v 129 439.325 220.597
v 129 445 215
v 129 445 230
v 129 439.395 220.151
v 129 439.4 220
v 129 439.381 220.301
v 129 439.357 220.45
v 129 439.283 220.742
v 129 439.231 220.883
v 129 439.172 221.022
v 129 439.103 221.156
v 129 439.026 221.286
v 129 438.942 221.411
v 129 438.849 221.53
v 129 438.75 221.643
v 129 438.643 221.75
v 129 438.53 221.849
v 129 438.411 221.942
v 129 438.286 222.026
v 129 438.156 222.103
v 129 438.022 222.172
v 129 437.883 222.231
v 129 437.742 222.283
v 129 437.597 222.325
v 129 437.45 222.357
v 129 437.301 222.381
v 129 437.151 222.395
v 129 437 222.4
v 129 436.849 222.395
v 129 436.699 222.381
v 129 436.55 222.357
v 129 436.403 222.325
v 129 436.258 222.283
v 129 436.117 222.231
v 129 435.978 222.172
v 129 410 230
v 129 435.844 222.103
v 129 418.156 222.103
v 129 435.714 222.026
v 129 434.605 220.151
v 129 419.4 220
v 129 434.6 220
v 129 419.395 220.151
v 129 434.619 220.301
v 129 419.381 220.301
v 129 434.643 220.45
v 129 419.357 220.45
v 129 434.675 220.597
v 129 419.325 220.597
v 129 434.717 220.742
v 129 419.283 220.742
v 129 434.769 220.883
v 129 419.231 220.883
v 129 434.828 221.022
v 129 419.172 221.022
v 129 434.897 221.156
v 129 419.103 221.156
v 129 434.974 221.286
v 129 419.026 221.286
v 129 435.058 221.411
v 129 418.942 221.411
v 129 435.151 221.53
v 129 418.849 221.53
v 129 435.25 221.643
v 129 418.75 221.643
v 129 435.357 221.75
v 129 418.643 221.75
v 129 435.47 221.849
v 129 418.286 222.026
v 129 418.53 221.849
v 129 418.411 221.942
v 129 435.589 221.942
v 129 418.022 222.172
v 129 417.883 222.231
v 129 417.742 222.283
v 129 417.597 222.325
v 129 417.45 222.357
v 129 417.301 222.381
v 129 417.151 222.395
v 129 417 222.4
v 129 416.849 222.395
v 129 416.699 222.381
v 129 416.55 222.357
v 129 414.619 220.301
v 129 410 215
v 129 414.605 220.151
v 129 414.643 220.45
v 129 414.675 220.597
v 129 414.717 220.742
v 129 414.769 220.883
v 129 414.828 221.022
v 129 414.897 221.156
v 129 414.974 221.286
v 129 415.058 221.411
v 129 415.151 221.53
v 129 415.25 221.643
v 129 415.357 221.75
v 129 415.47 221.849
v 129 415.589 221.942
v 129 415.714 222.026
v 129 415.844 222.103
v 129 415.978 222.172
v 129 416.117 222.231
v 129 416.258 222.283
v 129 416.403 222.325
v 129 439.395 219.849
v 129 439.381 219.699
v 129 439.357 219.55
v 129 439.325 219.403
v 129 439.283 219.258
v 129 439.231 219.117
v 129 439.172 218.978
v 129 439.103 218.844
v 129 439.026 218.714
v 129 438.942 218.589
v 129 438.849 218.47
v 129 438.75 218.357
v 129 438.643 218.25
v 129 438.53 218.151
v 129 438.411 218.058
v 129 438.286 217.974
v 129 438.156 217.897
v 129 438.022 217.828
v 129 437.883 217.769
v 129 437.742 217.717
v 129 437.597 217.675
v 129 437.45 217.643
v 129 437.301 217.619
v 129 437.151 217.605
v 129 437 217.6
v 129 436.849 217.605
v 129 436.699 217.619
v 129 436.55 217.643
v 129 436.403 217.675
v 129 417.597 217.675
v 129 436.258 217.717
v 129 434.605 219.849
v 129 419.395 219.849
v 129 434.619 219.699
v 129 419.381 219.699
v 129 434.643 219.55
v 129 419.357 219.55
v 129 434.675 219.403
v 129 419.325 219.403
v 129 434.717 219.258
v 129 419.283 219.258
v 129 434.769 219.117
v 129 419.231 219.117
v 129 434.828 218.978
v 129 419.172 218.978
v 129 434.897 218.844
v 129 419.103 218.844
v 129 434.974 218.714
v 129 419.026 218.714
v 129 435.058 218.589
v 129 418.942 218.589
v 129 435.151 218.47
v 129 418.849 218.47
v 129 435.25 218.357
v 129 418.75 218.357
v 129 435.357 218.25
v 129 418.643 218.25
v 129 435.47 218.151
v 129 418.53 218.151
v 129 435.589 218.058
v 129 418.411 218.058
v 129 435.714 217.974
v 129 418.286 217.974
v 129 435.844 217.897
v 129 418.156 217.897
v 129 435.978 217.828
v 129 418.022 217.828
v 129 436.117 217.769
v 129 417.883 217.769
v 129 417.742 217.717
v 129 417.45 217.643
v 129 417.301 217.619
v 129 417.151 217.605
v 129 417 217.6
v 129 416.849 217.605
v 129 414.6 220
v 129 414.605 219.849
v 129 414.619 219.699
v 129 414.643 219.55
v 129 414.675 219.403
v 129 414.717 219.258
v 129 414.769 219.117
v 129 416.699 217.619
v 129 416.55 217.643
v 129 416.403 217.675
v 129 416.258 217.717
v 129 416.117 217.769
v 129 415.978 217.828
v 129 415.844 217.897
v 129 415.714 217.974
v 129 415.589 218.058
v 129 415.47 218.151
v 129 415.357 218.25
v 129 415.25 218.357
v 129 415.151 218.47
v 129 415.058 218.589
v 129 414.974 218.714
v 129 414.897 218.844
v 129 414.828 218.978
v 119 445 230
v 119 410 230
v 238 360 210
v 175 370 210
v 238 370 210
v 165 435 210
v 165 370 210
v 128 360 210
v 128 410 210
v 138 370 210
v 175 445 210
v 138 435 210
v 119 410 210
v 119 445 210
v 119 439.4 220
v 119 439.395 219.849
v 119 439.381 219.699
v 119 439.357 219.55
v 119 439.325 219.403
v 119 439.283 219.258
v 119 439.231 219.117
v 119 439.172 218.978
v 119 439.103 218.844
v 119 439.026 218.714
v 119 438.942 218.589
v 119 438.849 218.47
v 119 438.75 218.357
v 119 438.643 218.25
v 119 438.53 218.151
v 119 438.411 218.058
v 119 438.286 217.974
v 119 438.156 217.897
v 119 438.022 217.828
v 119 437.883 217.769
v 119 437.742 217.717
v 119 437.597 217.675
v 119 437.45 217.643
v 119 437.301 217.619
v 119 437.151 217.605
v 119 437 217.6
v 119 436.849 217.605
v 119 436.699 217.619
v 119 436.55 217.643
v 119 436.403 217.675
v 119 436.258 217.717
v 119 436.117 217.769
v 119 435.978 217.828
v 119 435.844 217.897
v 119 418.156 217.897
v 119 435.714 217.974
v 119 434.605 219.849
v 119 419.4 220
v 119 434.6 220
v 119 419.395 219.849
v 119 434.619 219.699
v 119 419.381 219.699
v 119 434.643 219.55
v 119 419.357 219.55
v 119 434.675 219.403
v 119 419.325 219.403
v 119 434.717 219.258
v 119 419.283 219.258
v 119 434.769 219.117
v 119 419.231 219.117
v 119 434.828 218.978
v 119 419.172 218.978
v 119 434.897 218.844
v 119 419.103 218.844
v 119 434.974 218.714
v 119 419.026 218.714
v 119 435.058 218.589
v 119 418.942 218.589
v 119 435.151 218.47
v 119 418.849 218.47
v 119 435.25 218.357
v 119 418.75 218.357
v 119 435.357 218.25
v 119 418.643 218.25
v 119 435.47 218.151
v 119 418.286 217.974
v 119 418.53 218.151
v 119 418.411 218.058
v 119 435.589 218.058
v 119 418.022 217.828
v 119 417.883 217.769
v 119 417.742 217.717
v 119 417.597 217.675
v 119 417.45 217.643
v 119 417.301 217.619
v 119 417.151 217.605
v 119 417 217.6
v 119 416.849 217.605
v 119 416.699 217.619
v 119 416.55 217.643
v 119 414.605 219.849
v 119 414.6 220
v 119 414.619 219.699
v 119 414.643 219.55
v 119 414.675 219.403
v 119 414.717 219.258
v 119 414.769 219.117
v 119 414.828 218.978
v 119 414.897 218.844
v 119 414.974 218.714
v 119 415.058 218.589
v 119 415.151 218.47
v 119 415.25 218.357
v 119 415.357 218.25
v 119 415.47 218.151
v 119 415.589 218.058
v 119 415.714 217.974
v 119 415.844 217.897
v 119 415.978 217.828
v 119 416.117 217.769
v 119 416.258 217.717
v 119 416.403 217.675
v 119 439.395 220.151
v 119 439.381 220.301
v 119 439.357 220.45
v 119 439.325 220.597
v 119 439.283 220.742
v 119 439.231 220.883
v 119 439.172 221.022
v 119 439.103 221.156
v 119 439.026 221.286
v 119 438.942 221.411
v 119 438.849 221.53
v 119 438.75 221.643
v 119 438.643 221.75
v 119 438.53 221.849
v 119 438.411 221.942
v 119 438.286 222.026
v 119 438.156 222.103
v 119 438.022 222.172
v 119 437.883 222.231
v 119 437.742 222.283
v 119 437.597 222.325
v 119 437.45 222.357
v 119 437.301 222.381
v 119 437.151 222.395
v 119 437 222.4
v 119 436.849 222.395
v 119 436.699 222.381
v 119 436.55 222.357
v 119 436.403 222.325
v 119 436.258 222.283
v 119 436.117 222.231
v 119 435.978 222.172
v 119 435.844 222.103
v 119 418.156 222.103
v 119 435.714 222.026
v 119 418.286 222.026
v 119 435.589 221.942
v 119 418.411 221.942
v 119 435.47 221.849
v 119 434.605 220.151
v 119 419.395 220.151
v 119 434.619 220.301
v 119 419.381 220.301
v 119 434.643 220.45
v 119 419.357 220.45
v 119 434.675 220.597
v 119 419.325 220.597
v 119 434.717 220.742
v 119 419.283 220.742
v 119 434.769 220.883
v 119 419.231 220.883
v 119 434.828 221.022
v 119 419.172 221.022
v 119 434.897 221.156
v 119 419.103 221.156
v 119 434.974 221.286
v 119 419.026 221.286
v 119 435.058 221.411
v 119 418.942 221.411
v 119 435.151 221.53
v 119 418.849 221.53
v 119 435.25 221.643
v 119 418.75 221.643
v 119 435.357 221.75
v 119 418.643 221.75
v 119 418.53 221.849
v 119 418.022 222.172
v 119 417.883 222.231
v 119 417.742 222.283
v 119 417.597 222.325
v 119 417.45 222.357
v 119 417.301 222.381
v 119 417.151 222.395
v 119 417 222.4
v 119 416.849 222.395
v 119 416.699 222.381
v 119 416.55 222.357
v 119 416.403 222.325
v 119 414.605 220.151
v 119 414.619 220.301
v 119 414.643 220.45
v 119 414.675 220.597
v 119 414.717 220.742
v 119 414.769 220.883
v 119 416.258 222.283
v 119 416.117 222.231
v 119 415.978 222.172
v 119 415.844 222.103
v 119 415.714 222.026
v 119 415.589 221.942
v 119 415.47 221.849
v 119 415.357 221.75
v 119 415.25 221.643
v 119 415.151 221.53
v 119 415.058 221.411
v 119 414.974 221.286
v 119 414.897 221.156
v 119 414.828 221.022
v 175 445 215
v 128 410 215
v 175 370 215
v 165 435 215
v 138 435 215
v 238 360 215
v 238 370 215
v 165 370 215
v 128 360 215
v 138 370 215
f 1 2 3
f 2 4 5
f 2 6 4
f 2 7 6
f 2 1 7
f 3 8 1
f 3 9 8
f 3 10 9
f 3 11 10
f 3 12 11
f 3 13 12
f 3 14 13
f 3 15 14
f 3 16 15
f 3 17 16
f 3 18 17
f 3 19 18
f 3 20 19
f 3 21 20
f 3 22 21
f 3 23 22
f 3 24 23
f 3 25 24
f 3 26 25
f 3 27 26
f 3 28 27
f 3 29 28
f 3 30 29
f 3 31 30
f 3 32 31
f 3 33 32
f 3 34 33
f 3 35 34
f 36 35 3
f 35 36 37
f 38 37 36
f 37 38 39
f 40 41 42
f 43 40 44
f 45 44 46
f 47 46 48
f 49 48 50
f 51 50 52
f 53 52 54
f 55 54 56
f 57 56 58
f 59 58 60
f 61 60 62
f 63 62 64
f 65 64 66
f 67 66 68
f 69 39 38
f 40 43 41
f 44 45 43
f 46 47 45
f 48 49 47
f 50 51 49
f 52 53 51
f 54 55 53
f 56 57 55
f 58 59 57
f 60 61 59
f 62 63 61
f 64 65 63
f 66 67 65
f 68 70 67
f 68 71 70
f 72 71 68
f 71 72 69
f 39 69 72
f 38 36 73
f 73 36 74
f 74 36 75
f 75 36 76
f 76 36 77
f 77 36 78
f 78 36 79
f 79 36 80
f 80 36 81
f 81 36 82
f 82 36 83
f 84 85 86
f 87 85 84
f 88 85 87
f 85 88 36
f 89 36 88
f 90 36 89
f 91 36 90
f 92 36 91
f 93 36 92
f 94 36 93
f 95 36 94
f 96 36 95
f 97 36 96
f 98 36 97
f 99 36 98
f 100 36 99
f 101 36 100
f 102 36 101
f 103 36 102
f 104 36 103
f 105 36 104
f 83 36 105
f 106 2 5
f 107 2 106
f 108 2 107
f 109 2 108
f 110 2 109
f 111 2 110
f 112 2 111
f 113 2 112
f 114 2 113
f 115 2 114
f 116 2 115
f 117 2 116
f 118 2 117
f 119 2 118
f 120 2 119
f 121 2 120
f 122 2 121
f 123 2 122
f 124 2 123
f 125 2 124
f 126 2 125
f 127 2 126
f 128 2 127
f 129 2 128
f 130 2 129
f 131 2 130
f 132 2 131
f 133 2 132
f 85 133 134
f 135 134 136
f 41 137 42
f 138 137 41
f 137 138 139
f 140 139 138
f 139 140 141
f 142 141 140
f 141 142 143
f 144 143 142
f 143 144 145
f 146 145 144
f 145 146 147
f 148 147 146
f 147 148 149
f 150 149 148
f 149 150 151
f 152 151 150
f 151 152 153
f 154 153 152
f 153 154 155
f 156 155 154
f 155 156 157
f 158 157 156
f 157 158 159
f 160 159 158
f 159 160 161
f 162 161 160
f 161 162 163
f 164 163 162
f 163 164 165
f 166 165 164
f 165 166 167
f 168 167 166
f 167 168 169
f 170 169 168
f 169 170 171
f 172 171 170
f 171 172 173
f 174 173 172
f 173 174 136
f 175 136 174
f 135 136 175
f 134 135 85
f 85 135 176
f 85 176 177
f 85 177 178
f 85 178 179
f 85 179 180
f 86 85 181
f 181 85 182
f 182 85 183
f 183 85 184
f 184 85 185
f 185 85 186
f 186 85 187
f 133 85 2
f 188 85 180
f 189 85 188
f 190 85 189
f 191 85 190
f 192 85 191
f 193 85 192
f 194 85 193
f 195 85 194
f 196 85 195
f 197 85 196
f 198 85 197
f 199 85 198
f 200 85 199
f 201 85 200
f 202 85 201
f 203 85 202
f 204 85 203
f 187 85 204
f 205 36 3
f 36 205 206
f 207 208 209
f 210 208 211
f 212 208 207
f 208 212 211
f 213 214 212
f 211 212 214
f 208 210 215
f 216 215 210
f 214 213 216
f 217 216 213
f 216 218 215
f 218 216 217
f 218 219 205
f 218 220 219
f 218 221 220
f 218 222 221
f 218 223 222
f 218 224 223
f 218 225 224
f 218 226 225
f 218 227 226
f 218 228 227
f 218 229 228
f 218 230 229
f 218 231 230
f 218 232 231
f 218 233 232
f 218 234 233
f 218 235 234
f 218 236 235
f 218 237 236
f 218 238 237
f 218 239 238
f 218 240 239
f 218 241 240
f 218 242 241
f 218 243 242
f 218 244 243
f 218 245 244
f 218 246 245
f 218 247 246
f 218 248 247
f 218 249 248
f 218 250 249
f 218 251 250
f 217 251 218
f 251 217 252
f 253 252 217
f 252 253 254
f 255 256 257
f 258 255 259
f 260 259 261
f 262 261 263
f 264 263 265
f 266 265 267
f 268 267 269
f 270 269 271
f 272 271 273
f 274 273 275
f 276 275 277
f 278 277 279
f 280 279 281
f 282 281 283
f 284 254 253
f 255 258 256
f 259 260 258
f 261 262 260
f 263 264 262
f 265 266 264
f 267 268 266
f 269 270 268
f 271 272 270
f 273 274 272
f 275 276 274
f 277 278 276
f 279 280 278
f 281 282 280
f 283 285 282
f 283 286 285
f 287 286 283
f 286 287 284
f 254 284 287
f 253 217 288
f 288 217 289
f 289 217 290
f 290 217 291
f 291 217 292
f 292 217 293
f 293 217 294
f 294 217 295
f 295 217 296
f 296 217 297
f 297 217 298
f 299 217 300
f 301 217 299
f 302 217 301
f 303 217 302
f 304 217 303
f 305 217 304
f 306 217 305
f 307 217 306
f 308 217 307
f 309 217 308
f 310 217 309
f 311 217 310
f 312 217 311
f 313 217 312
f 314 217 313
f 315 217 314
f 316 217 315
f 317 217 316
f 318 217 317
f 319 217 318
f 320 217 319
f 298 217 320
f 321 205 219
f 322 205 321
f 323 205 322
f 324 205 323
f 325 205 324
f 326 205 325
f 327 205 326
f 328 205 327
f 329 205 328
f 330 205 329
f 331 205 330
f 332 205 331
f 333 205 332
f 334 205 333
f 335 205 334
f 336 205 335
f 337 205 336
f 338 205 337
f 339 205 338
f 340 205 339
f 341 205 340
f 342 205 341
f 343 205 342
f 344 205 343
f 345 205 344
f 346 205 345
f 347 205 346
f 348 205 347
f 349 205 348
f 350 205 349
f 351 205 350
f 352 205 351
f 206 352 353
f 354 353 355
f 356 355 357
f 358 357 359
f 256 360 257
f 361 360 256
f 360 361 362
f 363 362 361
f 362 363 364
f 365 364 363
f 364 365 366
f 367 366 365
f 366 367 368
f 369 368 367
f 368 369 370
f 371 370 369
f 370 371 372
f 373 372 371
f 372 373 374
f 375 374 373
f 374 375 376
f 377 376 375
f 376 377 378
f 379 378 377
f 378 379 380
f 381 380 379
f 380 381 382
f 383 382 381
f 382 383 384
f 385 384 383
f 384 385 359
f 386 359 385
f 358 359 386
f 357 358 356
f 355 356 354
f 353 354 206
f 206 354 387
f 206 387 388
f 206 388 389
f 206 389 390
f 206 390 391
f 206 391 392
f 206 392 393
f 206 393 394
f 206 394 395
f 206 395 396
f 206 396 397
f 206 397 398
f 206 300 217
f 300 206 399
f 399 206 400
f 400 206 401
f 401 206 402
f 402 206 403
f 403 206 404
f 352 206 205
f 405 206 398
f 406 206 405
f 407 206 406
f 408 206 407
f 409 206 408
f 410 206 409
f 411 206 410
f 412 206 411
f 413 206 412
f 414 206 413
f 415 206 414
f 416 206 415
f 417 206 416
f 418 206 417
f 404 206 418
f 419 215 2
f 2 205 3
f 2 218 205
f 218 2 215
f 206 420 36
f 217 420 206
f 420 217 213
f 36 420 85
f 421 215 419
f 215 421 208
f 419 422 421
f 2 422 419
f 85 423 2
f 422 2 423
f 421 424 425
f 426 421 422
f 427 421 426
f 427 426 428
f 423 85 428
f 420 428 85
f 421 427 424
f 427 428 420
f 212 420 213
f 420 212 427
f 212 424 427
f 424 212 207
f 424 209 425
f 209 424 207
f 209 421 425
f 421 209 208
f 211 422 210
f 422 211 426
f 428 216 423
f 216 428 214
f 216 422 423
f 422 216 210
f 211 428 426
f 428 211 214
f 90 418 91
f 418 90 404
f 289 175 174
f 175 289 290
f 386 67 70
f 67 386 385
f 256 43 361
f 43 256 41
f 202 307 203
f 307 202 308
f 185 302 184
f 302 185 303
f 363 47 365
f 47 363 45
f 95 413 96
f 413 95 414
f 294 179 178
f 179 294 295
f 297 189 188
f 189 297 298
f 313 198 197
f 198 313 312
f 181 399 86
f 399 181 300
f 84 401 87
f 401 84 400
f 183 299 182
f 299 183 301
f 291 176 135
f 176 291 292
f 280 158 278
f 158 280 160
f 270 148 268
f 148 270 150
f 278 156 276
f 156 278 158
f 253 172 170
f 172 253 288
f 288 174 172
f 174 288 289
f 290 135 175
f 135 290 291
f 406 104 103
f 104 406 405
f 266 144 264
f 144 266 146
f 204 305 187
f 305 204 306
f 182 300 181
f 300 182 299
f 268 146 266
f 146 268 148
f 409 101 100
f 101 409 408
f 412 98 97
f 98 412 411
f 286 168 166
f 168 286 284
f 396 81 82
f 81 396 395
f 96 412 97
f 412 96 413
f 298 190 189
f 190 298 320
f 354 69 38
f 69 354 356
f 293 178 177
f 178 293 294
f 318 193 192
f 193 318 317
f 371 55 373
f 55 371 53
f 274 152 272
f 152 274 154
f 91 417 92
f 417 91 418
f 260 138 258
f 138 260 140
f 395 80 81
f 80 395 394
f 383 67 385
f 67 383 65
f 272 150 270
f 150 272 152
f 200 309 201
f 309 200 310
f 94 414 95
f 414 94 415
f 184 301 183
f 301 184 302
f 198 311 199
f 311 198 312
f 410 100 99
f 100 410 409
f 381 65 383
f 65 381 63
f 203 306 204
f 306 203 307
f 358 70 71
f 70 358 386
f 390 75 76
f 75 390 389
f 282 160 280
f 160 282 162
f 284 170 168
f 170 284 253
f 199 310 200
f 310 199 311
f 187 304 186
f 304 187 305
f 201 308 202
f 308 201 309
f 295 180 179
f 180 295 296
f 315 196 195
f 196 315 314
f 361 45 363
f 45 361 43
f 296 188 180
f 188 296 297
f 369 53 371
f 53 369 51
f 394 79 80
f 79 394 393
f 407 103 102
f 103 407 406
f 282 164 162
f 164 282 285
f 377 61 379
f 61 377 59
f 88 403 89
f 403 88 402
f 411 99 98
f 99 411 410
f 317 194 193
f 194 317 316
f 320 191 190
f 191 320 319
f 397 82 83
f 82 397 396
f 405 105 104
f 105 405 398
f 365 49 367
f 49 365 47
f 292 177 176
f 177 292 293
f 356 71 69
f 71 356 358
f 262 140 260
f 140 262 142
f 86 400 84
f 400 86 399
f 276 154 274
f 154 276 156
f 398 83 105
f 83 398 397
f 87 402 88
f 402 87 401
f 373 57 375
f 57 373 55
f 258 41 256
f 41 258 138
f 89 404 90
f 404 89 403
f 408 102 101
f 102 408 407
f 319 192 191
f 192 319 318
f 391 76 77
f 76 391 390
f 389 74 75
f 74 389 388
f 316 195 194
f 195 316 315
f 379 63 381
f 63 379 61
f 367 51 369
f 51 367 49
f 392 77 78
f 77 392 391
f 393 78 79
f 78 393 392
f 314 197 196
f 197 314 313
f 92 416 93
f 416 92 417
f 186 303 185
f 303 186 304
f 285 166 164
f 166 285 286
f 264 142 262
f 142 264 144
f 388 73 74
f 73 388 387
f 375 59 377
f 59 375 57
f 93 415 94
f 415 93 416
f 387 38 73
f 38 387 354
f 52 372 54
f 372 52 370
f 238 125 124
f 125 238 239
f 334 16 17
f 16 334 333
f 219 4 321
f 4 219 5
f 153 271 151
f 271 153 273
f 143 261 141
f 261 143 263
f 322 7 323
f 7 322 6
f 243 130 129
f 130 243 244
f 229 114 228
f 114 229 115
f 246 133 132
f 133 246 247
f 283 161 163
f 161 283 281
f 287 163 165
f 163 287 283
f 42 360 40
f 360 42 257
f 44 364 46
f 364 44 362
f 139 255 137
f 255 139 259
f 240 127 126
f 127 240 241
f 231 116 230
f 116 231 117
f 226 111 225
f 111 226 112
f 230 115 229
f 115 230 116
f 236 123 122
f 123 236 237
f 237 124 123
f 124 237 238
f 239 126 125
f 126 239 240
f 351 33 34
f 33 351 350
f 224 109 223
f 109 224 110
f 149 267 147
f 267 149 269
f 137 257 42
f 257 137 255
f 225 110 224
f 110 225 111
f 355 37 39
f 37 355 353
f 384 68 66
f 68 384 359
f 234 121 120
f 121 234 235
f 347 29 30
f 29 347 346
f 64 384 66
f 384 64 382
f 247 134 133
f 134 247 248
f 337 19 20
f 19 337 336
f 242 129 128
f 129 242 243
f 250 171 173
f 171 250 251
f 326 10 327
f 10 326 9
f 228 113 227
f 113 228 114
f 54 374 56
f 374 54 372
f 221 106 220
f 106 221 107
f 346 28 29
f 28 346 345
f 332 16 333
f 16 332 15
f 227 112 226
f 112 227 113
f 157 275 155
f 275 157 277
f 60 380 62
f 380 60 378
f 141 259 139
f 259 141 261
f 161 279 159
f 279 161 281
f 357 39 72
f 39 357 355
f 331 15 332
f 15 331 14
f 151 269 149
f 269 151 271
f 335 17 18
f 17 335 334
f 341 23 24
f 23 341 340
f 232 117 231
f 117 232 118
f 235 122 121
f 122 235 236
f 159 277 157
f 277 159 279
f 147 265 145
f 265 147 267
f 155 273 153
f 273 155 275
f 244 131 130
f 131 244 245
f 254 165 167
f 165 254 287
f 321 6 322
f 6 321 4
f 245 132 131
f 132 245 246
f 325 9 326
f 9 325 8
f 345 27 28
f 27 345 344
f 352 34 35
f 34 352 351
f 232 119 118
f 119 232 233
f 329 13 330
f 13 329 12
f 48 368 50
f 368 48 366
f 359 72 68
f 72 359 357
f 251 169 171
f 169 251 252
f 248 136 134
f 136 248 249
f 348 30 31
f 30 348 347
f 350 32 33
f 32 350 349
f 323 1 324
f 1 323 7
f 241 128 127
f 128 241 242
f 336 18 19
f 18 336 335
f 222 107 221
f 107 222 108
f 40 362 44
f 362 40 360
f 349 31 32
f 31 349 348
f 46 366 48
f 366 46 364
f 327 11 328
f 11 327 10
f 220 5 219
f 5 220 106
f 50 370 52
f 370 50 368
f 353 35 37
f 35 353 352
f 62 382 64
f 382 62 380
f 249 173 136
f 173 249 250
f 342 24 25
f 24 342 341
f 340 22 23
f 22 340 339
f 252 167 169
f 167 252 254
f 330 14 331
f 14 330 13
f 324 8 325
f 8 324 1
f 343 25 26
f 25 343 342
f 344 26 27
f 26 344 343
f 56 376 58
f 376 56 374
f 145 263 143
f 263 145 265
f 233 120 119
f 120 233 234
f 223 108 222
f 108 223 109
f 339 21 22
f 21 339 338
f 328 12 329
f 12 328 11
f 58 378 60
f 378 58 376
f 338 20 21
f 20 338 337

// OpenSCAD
//plate();
//base();
//plate_template();

//prespot_template();

plate_aligner();


module plate_aligner(){
    difference(){
      union(){ 
      translate([119,410,210])cube([10,35,20]);
      translate([128,410-50,210])cube([10+37,35+50,5]);
      translate([128,410-50,210])cube([10+100,10,5]);
      }
      translate([128+10,410-40,210])cube([10+17,35+30,5]);
      translate([109,417,220])rotate([0,90,0])#cylinder(d=4.8,h=20,$fn=100);
      translate([109,437,220])rotate([0,90,0])#cylinder(d=4.8,h=20,$fn=100);
    }
}


module prespot_template(){
difference(){
cube([100,18,2]);
}
}



module plate_template(){
difference(){
cube([100,100,2]);
#translate([20,20,-1])cube([60,60,20]);
}
}

module plate(){
difference(){
union(){
hull(){
translate([-4,-4,-2.5])cube([105+8,100+20+3+8,5]);
//translate([-4+25,-4+25,-2.5-25])cube([105+8-50,100+20+3+8-50,5]);
}
}
cube([105,100,10]);
translate([0,100+3,0])cube([105,20,10]);
}
}

module base(){
difference(){
union(){
hull(){
translate([-4,-4,-2.5-5])cube([105+8,100+20+3+8,5]);
translate([-4+25,-4+25,-2.5-25])cube([105+8-50,100+20+3+8-50,5]);
}
}
hull(){
translate([-4+40,-4+40,-2.5-25])cube([105+8-80,100+20+3+8-80,50]);
translate([-4+10,-4+10,-2.5-5])cube([105+8-20,100+20+3+8-20,50]);
}
}
}
